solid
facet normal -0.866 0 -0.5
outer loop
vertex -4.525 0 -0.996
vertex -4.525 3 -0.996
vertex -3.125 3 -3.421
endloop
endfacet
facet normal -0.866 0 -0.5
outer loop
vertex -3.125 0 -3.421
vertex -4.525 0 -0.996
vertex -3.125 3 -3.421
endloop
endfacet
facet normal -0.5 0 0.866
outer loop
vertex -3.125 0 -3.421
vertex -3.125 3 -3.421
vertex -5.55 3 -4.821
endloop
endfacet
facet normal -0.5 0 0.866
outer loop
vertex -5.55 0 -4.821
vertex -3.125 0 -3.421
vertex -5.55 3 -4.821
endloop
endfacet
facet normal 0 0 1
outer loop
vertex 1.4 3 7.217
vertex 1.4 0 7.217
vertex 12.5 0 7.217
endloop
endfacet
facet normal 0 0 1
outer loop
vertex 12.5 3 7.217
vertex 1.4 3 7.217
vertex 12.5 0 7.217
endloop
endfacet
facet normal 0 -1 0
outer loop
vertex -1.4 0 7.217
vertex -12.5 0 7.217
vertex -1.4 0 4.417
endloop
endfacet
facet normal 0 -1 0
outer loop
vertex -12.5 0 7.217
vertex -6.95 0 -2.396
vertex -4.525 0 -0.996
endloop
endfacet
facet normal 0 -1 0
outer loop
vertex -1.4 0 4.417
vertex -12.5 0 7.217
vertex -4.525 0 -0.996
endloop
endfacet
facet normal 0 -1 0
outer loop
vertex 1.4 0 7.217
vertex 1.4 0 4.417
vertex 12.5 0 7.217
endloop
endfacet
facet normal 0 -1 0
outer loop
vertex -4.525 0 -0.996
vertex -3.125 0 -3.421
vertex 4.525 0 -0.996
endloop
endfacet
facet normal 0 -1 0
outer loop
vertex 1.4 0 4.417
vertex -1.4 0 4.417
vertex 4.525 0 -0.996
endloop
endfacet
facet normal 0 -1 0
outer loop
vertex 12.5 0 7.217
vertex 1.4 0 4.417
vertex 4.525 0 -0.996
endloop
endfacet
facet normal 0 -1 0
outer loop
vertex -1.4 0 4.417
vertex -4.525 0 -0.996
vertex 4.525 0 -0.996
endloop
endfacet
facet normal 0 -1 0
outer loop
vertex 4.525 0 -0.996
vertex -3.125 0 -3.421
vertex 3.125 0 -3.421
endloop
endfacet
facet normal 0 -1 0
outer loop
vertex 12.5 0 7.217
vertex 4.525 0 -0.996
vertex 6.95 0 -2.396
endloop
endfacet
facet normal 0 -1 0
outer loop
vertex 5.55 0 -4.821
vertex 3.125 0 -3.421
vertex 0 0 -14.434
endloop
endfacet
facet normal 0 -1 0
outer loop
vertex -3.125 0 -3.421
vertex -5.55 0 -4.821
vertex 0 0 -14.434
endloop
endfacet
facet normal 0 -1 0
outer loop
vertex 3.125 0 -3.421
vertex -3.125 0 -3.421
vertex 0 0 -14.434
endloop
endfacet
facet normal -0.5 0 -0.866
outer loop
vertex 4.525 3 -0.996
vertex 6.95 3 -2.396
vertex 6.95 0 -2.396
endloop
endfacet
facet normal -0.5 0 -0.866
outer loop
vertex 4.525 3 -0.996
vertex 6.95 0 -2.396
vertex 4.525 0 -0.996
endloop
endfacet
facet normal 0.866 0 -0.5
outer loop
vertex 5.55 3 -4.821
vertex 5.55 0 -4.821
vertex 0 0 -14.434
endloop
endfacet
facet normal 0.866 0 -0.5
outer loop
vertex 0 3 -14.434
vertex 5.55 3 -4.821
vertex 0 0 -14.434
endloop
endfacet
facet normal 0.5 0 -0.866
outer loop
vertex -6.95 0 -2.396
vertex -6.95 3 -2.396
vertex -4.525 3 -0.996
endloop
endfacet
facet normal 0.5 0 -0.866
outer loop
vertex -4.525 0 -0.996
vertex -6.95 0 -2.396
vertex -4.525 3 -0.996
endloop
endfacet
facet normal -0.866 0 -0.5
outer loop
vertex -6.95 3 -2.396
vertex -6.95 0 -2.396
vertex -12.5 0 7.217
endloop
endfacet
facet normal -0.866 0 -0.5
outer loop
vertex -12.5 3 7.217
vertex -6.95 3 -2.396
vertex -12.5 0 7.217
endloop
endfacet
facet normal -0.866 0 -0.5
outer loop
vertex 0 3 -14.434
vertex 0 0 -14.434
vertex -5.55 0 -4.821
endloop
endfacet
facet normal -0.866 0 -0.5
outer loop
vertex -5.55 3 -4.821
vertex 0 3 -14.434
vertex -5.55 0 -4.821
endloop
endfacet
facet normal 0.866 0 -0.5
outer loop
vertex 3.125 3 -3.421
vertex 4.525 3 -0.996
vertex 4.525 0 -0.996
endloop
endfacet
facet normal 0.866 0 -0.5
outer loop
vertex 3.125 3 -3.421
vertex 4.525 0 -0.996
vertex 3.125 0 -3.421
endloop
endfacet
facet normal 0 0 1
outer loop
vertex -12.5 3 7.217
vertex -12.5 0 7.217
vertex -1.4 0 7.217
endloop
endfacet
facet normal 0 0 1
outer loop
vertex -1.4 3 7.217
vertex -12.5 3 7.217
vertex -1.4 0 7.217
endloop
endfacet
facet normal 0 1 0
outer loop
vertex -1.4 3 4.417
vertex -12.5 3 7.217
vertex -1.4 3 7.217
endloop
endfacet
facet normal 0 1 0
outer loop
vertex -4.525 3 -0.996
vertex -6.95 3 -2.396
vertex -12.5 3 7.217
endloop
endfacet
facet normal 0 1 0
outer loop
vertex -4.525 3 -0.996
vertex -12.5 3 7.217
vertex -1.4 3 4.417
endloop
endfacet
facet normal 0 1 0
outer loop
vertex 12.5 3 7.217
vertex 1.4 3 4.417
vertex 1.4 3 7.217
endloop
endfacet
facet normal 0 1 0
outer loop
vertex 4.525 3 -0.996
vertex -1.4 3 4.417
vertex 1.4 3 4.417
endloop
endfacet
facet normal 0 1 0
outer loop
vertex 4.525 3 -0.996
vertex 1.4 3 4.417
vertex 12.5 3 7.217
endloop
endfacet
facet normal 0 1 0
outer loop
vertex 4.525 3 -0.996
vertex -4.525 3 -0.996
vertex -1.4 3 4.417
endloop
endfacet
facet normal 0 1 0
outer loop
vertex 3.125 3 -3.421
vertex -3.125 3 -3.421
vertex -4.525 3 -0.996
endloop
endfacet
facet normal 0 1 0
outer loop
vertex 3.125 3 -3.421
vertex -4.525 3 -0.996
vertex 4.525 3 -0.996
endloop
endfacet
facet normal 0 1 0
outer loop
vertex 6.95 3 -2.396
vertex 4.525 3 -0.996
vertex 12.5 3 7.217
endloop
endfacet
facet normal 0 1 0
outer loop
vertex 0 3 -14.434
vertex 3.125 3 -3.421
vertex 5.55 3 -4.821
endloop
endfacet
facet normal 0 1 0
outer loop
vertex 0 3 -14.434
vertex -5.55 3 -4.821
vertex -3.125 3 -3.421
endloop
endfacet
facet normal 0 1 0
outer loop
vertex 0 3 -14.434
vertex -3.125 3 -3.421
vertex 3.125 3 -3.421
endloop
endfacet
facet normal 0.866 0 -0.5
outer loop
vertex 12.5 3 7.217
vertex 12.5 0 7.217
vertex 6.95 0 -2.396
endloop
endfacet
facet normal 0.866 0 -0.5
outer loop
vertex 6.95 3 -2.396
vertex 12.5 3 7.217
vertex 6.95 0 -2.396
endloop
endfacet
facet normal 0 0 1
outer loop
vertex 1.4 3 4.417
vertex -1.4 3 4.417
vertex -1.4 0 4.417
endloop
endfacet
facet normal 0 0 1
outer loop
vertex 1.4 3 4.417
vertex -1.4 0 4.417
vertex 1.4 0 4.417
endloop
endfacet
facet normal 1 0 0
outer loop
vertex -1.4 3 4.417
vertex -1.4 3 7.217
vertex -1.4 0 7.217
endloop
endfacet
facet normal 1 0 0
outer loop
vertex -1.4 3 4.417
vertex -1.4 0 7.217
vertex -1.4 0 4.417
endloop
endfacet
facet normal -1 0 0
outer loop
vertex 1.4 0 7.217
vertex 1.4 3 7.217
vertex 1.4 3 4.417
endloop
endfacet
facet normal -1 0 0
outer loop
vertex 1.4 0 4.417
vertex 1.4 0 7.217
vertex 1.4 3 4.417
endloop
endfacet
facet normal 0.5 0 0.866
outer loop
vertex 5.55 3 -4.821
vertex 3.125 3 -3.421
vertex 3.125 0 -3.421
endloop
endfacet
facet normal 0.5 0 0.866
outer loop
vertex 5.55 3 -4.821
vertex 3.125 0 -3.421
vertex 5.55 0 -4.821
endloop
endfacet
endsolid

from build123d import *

# Parameters (mm, degrees)
BOSS_EXTRUDE1_DEPTH = 3
CUT_EXTRUDE1_REACH  = 5
SKETCH3_W           = 2.8
SKETCH3_H           = 2.8


with BuildPart() as part:
    # Sketch1 → Boss-Extrude1 (new body)
    with BuildSketch(Plane(origin=(0, 0, 0), x_dir=(1, 0, 0), z_dir=(0, 1, 0))):
        Polygon((0, 14.43375673), (-12.5, -7.216878365), (12.5, -7.216878365), align=None)
    extrude(amount=BOSS_EXTRUDE1_DEPTH)

    # Sketch3 → Cut-Extrude1 (cut, up to next)
    with BuildSketch(Plane(origin=(0, 3, 0), x_dir=(1, 0, 0), z_dir=(0, 1, 0)), mode=Mode.PRIVATE) as cut_extrude1_sk1:
        Polygon((6.95, 2.396003617), (4.525128869, 0.996003617), (3.125128869, 3.420874748), (5.55, 4.820874748), align=None)
    cut_extrude1_tool1 = extrude(cut_extrude1_sk1.sketch, amount=-CUT_EXTRUDE1_REACH, mode=Mode.PRIVATE) & part.part
    add(cut_extrude1_tool1.solids().sort_by_distance((5.037564, 3, -2.908439))[0], mode=Mode.SUBTRACT)
    # Sketch3 → Cut-Extrude1 (cut, up to next)
    with BuildSketch(Plane(origin=(0, 3, 0), x_dir=(1, 0, 0), z_dir=(0, 1, 0)), mode=Mode.PRIVATE) as cut_extrude1_sk2:
        Polygon((-6.95, 2.396003617), (-4.525128869, 0.996003617), (-3.125128869, 3.420874748), (-5.55, 4.820874748), align=None)
    cut_extrude1_tool2 = extrude(cut_extrude1_sk2.sketch, amount=-CUT_EXTRUDE1_REACH, mode=Mode.PRIVATE) & part.part
    add(cut_extrude1_tool2.solids().sort_by_distance((-5.037564, 3, -2.908439))[0], mode=Mode.SUBTRACT)
    # Sketch3 → Cut-Extrude1 (cut, up to next)
    with BuildSketch(Plane(origin=(0, 3, 0), x_dir=(1, 0, 0), z_dir=(0, 1, 0)), mode=Mode.PRIVATE) as cut_extrude1_sk3:
        with Locations((0, -5.816878365)):
            Rectangle(SKETCH3_W, SKETCH3_H)
    cut_extrude1_tool3 = extrude(cut_extrude1_sk3.sketch, amount=-CUT_EXTRUDE1_REACH, mode=Mode.PRIVATE) & part.part
    add(cut_extrude1_tool3.solids().sort_by_distance((0, 3, 5.816878))[0], mode=Mode.SUBTRACT)


solid = part.part
